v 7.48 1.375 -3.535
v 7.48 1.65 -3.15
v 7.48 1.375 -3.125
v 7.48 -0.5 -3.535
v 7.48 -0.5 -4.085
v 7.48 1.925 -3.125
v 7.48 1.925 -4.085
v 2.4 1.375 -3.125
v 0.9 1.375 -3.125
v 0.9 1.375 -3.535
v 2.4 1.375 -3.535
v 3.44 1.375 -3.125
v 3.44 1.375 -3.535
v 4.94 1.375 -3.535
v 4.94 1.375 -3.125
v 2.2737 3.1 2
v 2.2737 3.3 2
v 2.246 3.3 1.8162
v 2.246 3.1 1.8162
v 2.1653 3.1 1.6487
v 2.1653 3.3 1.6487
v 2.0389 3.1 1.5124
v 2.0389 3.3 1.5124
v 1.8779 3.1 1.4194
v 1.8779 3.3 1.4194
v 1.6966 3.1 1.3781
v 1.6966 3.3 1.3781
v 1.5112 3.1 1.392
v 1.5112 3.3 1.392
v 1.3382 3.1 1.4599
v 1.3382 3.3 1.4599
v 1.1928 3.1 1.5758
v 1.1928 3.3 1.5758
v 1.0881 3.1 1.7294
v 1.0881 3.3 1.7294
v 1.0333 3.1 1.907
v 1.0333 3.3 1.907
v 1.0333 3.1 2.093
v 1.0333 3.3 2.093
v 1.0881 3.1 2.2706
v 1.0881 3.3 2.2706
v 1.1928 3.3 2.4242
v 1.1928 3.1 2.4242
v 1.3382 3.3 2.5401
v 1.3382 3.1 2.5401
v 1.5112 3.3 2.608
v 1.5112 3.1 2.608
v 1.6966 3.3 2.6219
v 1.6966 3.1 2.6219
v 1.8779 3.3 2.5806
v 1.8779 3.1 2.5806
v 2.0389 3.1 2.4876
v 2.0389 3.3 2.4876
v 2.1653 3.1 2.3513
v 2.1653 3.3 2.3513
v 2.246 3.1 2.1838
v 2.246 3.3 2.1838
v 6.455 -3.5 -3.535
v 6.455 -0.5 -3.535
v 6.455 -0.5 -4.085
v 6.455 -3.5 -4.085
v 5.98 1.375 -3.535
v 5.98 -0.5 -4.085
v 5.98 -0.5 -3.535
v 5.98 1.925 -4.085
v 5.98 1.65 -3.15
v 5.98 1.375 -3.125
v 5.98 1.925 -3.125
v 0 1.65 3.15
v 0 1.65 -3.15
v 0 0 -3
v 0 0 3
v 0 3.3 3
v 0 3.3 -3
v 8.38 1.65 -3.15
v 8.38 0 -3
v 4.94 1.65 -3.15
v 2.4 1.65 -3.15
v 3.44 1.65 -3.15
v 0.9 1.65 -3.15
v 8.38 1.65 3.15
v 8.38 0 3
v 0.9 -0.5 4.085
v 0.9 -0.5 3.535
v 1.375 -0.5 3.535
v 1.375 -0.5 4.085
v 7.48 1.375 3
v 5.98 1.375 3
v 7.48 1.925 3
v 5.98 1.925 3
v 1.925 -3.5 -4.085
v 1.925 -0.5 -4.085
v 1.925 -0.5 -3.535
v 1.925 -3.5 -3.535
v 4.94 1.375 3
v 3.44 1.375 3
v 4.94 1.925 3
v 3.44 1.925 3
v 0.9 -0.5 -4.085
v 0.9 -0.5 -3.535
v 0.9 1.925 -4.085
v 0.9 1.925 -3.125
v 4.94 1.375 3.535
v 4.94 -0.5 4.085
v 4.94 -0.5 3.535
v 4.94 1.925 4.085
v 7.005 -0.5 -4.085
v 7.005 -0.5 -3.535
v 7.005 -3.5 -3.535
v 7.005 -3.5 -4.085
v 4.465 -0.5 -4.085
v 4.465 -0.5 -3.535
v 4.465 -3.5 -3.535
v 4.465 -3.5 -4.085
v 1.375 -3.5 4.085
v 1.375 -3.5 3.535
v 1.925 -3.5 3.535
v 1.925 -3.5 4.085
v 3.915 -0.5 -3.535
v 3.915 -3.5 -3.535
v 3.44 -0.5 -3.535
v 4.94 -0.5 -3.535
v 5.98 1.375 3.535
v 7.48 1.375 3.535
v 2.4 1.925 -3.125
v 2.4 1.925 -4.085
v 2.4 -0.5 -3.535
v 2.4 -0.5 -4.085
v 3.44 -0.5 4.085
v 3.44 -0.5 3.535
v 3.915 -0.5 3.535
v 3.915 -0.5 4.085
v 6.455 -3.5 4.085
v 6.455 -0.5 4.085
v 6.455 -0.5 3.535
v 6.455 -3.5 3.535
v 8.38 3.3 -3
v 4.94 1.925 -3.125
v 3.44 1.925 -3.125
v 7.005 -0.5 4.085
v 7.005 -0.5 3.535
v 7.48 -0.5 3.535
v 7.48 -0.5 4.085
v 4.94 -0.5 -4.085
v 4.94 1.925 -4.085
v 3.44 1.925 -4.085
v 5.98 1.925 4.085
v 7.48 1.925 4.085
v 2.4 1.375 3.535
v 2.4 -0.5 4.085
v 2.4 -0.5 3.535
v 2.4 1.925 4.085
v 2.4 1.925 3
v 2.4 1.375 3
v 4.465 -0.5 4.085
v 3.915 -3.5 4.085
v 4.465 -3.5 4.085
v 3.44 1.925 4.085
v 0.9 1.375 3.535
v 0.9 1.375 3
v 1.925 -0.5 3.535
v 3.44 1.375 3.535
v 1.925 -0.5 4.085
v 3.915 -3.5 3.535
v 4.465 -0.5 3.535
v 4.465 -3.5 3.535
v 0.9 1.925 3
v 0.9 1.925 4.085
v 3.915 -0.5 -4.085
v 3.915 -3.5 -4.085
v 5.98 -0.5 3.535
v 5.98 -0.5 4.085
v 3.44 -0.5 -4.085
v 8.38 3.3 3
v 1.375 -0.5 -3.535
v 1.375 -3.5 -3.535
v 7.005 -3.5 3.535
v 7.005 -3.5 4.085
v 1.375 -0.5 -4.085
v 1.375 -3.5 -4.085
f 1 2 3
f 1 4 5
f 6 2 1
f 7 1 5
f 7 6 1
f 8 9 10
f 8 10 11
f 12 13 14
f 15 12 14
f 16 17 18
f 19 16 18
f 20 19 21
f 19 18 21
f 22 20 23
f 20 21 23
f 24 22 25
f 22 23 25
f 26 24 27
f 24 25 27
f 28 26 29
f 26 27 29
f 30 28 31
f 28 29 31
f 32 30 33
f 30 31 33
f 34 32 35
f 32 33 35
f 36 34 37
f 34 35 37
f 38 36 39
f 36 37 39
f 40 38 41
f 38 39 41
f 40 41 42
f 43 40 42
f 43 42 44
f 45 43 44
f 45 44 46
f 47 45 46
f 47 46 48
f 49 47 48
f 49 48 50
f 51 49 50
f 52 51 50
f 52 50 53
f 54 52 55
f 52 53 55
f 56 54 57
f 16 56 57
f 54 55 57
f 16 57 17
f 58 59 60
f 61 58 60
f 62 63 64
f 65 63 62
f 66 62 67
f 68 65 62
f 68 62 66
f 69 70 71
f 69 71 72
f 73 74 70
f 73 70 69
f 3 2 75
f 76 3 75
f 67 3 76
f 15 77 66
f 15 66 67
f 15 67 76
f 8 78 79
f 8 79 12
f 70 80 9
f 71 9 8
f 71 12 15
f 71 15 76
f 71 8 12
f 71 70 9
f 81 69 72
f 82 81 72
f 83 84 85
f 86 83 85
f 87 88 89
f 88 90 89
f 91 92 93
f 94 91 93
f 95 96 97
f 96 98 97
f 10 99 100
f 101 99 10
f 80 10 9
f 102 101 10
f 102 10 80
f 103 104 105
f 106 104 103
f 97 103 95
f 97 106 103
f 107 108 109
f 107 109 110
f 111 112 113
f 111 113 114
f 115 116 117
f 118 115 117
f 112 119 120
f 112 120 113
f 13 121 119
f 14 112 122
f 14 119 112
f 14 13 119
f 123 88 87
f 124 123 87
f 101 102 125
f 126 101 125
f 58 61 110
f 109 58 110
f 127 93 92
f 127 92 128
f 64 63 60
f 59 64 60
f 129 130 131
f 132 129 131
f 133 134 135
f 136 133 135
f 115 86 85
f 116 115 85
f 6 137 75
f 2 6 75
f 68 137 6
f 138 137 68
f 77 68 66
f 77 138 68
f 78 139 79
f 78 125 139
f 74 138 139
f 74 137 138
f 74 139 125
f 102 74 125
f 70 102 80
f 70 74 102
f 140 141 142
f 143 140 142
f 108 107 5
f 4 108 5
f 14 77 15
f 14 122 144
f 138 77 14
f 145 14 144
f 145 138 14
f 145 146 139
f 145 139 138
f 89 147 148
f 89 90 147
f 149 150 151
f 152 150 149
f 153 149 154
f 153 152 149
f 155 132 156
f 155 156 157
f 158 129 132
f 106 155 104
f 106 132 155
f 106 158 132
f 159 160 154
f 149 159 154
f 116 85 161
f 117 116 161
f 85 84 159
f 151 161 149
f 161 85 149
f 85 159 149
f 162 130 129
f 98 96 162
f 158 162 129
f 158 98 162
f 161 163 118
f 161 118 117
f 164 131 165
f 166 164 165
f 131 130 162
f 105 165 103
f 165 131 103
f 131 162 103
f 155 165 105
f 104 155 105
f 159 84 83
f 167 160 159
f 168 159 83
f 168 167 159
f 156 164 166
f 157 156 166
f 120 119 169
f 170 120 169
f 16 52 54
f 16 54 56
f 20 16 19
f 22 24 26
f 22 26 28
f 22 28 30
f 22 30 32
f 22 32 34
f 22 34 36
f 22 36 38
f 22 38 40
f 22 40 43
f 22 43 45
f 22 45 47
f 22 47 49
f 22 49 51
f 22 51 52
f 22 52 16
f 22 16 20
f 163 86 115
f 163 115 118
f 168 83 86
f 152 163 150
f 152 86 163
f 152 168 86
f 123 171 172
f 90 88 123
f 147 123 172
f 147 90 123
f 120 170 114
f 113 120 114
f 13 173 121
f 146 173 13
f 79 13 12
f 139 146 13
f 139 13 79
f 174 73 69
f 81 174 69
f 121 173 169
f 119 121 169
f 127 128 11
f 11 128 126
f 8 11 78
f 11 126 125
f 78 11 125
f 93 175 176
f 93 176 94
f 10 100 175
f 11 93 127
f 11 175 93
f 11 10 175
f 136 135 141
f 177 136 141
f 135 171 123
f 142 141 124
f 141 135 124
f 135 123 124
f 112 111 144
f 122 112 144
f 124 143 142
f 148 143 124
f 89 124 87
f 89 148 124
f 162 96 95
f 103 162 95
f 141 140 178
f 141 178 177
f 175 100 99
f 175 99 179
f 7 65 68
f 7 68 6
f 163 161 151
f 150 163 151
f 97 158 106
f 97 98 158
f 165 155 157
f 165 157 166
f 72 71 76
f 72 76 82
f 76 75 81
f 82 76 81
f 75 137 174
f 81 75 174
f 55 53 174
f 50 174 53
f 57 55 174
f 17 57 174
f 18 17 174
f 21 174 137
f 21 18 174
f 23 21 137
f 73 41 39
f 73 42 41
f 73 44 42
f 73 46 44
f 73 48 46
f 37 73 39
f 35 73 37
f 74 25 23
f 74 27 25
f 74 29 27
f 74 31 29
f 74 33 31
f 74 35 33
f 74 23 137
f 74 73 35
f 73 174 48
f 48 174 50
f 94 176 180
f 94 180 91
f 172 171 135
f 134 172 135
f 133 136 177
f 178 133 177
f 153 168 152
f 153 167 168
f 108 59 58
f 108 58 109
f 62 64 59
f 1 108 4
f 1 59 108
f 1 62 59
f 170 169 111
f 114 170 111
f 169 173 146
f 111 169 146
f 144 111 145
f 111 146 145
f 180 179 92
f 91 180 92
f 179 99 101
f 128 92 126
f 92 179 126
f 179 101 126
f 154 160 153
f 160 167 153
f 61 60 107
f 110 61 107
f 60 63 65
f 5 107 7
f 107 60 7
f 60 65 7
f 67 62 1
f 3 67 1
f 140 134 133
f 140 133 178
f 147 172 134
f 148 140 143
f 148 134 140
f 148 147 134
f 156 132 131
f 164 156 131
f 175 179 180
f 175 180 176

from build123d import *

# Parameters (mm, degrees)
BOSS_EXTRUDE1_DEPTH     = 8.38
SKETCH5_W               = 1.5
SKETCH5_H               = 1.085
BOSS_EXTRUDE2_DEPTH     = 0.275
SKETCH5_3_W             = 1.5
SKETCH5_3_H             = 0.55
BOSS_EXTRUDE4_DEPTH     = 2.15
SKETCH3_W               = 0.55
SKETCH3_H               = 0.55
BOSS_EXTRUDE5_DEPTH     = 3.5
LPATTERN1_COUNT         = 3
LPATTERN1_PITCH         = 2.54
MIRROR3_COPY_1_SKETCH_W = 1.5
MIRROR3_COPY_1_SKETCH_H = 1.085
MIRROR3_COPY_1_DEPTH    = 0.275
MIRROR3_COPY_2_SKETCH_W = 1.5
MIRROR3_COPY_2_SKETCH_H = 1.085
MIRROR3_COPY_2_DEPTH    = 0.275
MIRROR3_COPY_3_SKETCH_W = 1.5
MIRROR3_COPY_3_SKETCH_H = 0.55
MIRROR3_COPY_3_DEPTH    = 2.15
MIRROR3_COPY_4_SKETCH_W = 1.5
MIRROR3_COPY_4_SKETCH_H = 0.55
MIRROR3_COPY_4_DEPTH    = 2.15
MIRROR3_COPY_5_SKETCH_W = 0.55
MIRROR3_COPY_5_SKETCH_H = 0.55
MIRROR3_COPY_5_DEPTH    = 3.5
MIRROR3_COPY_6_SKETCH_W = 0.55
MIRROR3_COPY_6_SKETCH_H = 0.55
MIRROR3_COPY_6_DEPTH    = 3.5
SKETCH6_R               = 0.623672025
CUT_EXTRUDE1_DEPTH      = 0.2


with BuildPart() as part:
    # Sketch2 → Boss-Extrude1 (new body)
    with BuildSketch(Plane(origin=(0, 0, 0), x_dir=(0, 0, -1), z_dir=(1, 0, 0))):
        Polygon((0, 0), (0, 3.3), (-3, 3.3), (-3.15, 1.65), (-3, 0), align=None)
    boss_extrude1 = extrude(amount=BOSS_EXTRUDE1_DEPTH)

    # Mirror2: Boss-Extrude1 across plane
    add(boss_extrude1.mirror(Plane.XY))


with BuildPart() as body_2:
    # Sketch5 → Boss-Extrude2 (new, symmetric)
    with BuildSketch(Plane(origin=(0, 1.65, 0), x_dir=(1, 0, 0), z_dir=(0, 1, 0))):
        with Locations((1.65, -3.5425)):
            Rectangle(SKETCH5_W, SKETCH5_H)
    boss_extrude2 = extrude(amount=BOSS_EXTRUDE2_DEPTH, both=True)

    # Sketch5<3> → Boss-Extrude4 (add)
    with BuildSketch(Plane(origin=(0, 1.65, 0), x_dir=(1, 0, 0), z_dir=(0, 1, 0))):
        with Locations((1.65, -3.81)):
            Rectangle(SKETCH5_3_W, SKETCH5_3_H)
    boss_extrude4 = extrude(amount=-BOSS_EXTRUDE4_DEPTH)

    # Sketch3 → Boss-Extrude5 (add)
    with BuildSketch(Plane(origin=(0, 0, 0), x_dir=(1, 0, 0), z_dir=(0, 1, 0))):
        with Locations((1.65, -3.81)):
            Rectangle(SKETCH3_W, SKETCH3_H)
    boss_extrude5 = extrude(amount=-BOSS_EXTRUDE5_DEPTH)


with BuildPart() as lpattern1_1:
    # LPattern1: Boss-Extrude2, Boss-Extrude4, Boss-Extrude5 ×3
    with Locations(*[(i * LPATTERN1_PITCH, 0, 0) for i in range(1, LPATTERN1_COUNT)]):
        add(boss_extrude2)
        add(boss_extrude4)
        add(boss_extrude5)


with BuildPart() as part_1:
    add(part.part)

    # Mirror3: Boss-Extrude2, Boss-Extrude4, Boss-Extrude5 across plane
    add(boss_extrude2.mirror(Plane.XY))
    add(boss_extrude4.mirror(Plane.XY))
    add(boss_extrude5.mirror(Plane.XY))

    # Mirror3 copy 1 sketch → Mirror3 copy 1 (add, symmetric)
    with BuildSketch(Plane(origin=(2.54, 1.65, 0), x_dir=(1, 0, 0), z_dir=(0, 1, 0))):
        with Locations((1.65, 3.5425)):
            Rectangle(MIRROR3_COPY_1_SKETCH_W, MIRROR3_COPY_1_SKETCH_H)
    extrude(amount=MIRROR3_COPY_1_DEPTH, both=True)

    # Mirror3 copy 2 sketch → Mirror3 copy 2 (add, symmetric)
    with BuildSketch(Plane(origin=(5.08, 1.65, 0), x_dir=(1, 0, 0), z_dir=(0, 1, 0))):
        with Locations((1.65, 3.5425)):
            Rectangle(MIRROR3_COPY_2_SKETCH_W, MIRROR3_COPY_2_SKETCH_H)
    extrude(amount=MIRROR3_COPY_2_DEPTH, both=True)

    # Mirror3 copy 3 sketch → Mirror3 copy 3 (add)
    with BuildSketch(Plane(origin=(2.54, 1.65, 0), x_dir=(1, 0, 0), z_dir=(0, 1, 0))):
        with Locations((1.65, 3.81)):
            Rectangle(MIRROR3_COPY_3_SKETCH_W, MIRROR3_COPY_3_SKETCH_H)
    extrude(amount=-MIRROR3_COPY_3_DEPTH)

    # Mirror3 copy 4 sketch → Mirror3 copy 4 (add)
    with BuildSketch(Plane(origin=(5.08, 1.65, 0), x_dir=(1, 0, 0), z_dir=(0, 1, 0))):
        with Locations((1.65, 3.81)):
            Rectangle(MIRROR3_COPY_4_SKETCH_W, MIRROR3_COPY_4_SKETCH_H)
    extrude(amount=-MIRROR3_COPY_4_DEPTH)

    # Mirror3 copy 5 sketch → Mirror3 copy 5 (add)
    with BuildSketch(Plane(origin=(2.54, 0, 0), x_dir=(1, 0, 0), z_dir=(0, 1, 0))):
        with Locations((1.65, 3.81)):
            Rectangle(MIRROR3_COPY_5_SKETCH_W, MIRROR3_COPY_5_SKETCH_H)
    extrude(amount=-MIRROR3_COPY_5_DEPTH)

    # Mirror3 copy 6 sketch → Mirror3 copy 6 (add)
    with BuildSketch(Plane(origin=(5.08, 0, 0), x_dir=(1, 0, 0), z_dir=(0, 1, 0))):
        with Locations((1.65, 3.81)):
            Rectangle(MIRROR3_COPY_6_SKETCH_W, MIRROR3_COPY_6_SKETCH_H)
    extrude(amount=-MIRROR3_COPY_6_DEPTH)

    # Sketch6 → Cut-Extrude1 (cut)
    with BuildSketch(Plane(origin=(0, 3.3, 0), x_dir=(1, 0, 0), z_dir=(0, 1, 0))):
        with Locations((1.65, -2)):
            Circle(SKETCH6_R)
    extrude(amount=-CUT_EXTRUDE1_DEPTH, mode=Mode.SUBTRACT)


solid = Compound([body_2.part, lpattern1_1.part, part_1.part])
